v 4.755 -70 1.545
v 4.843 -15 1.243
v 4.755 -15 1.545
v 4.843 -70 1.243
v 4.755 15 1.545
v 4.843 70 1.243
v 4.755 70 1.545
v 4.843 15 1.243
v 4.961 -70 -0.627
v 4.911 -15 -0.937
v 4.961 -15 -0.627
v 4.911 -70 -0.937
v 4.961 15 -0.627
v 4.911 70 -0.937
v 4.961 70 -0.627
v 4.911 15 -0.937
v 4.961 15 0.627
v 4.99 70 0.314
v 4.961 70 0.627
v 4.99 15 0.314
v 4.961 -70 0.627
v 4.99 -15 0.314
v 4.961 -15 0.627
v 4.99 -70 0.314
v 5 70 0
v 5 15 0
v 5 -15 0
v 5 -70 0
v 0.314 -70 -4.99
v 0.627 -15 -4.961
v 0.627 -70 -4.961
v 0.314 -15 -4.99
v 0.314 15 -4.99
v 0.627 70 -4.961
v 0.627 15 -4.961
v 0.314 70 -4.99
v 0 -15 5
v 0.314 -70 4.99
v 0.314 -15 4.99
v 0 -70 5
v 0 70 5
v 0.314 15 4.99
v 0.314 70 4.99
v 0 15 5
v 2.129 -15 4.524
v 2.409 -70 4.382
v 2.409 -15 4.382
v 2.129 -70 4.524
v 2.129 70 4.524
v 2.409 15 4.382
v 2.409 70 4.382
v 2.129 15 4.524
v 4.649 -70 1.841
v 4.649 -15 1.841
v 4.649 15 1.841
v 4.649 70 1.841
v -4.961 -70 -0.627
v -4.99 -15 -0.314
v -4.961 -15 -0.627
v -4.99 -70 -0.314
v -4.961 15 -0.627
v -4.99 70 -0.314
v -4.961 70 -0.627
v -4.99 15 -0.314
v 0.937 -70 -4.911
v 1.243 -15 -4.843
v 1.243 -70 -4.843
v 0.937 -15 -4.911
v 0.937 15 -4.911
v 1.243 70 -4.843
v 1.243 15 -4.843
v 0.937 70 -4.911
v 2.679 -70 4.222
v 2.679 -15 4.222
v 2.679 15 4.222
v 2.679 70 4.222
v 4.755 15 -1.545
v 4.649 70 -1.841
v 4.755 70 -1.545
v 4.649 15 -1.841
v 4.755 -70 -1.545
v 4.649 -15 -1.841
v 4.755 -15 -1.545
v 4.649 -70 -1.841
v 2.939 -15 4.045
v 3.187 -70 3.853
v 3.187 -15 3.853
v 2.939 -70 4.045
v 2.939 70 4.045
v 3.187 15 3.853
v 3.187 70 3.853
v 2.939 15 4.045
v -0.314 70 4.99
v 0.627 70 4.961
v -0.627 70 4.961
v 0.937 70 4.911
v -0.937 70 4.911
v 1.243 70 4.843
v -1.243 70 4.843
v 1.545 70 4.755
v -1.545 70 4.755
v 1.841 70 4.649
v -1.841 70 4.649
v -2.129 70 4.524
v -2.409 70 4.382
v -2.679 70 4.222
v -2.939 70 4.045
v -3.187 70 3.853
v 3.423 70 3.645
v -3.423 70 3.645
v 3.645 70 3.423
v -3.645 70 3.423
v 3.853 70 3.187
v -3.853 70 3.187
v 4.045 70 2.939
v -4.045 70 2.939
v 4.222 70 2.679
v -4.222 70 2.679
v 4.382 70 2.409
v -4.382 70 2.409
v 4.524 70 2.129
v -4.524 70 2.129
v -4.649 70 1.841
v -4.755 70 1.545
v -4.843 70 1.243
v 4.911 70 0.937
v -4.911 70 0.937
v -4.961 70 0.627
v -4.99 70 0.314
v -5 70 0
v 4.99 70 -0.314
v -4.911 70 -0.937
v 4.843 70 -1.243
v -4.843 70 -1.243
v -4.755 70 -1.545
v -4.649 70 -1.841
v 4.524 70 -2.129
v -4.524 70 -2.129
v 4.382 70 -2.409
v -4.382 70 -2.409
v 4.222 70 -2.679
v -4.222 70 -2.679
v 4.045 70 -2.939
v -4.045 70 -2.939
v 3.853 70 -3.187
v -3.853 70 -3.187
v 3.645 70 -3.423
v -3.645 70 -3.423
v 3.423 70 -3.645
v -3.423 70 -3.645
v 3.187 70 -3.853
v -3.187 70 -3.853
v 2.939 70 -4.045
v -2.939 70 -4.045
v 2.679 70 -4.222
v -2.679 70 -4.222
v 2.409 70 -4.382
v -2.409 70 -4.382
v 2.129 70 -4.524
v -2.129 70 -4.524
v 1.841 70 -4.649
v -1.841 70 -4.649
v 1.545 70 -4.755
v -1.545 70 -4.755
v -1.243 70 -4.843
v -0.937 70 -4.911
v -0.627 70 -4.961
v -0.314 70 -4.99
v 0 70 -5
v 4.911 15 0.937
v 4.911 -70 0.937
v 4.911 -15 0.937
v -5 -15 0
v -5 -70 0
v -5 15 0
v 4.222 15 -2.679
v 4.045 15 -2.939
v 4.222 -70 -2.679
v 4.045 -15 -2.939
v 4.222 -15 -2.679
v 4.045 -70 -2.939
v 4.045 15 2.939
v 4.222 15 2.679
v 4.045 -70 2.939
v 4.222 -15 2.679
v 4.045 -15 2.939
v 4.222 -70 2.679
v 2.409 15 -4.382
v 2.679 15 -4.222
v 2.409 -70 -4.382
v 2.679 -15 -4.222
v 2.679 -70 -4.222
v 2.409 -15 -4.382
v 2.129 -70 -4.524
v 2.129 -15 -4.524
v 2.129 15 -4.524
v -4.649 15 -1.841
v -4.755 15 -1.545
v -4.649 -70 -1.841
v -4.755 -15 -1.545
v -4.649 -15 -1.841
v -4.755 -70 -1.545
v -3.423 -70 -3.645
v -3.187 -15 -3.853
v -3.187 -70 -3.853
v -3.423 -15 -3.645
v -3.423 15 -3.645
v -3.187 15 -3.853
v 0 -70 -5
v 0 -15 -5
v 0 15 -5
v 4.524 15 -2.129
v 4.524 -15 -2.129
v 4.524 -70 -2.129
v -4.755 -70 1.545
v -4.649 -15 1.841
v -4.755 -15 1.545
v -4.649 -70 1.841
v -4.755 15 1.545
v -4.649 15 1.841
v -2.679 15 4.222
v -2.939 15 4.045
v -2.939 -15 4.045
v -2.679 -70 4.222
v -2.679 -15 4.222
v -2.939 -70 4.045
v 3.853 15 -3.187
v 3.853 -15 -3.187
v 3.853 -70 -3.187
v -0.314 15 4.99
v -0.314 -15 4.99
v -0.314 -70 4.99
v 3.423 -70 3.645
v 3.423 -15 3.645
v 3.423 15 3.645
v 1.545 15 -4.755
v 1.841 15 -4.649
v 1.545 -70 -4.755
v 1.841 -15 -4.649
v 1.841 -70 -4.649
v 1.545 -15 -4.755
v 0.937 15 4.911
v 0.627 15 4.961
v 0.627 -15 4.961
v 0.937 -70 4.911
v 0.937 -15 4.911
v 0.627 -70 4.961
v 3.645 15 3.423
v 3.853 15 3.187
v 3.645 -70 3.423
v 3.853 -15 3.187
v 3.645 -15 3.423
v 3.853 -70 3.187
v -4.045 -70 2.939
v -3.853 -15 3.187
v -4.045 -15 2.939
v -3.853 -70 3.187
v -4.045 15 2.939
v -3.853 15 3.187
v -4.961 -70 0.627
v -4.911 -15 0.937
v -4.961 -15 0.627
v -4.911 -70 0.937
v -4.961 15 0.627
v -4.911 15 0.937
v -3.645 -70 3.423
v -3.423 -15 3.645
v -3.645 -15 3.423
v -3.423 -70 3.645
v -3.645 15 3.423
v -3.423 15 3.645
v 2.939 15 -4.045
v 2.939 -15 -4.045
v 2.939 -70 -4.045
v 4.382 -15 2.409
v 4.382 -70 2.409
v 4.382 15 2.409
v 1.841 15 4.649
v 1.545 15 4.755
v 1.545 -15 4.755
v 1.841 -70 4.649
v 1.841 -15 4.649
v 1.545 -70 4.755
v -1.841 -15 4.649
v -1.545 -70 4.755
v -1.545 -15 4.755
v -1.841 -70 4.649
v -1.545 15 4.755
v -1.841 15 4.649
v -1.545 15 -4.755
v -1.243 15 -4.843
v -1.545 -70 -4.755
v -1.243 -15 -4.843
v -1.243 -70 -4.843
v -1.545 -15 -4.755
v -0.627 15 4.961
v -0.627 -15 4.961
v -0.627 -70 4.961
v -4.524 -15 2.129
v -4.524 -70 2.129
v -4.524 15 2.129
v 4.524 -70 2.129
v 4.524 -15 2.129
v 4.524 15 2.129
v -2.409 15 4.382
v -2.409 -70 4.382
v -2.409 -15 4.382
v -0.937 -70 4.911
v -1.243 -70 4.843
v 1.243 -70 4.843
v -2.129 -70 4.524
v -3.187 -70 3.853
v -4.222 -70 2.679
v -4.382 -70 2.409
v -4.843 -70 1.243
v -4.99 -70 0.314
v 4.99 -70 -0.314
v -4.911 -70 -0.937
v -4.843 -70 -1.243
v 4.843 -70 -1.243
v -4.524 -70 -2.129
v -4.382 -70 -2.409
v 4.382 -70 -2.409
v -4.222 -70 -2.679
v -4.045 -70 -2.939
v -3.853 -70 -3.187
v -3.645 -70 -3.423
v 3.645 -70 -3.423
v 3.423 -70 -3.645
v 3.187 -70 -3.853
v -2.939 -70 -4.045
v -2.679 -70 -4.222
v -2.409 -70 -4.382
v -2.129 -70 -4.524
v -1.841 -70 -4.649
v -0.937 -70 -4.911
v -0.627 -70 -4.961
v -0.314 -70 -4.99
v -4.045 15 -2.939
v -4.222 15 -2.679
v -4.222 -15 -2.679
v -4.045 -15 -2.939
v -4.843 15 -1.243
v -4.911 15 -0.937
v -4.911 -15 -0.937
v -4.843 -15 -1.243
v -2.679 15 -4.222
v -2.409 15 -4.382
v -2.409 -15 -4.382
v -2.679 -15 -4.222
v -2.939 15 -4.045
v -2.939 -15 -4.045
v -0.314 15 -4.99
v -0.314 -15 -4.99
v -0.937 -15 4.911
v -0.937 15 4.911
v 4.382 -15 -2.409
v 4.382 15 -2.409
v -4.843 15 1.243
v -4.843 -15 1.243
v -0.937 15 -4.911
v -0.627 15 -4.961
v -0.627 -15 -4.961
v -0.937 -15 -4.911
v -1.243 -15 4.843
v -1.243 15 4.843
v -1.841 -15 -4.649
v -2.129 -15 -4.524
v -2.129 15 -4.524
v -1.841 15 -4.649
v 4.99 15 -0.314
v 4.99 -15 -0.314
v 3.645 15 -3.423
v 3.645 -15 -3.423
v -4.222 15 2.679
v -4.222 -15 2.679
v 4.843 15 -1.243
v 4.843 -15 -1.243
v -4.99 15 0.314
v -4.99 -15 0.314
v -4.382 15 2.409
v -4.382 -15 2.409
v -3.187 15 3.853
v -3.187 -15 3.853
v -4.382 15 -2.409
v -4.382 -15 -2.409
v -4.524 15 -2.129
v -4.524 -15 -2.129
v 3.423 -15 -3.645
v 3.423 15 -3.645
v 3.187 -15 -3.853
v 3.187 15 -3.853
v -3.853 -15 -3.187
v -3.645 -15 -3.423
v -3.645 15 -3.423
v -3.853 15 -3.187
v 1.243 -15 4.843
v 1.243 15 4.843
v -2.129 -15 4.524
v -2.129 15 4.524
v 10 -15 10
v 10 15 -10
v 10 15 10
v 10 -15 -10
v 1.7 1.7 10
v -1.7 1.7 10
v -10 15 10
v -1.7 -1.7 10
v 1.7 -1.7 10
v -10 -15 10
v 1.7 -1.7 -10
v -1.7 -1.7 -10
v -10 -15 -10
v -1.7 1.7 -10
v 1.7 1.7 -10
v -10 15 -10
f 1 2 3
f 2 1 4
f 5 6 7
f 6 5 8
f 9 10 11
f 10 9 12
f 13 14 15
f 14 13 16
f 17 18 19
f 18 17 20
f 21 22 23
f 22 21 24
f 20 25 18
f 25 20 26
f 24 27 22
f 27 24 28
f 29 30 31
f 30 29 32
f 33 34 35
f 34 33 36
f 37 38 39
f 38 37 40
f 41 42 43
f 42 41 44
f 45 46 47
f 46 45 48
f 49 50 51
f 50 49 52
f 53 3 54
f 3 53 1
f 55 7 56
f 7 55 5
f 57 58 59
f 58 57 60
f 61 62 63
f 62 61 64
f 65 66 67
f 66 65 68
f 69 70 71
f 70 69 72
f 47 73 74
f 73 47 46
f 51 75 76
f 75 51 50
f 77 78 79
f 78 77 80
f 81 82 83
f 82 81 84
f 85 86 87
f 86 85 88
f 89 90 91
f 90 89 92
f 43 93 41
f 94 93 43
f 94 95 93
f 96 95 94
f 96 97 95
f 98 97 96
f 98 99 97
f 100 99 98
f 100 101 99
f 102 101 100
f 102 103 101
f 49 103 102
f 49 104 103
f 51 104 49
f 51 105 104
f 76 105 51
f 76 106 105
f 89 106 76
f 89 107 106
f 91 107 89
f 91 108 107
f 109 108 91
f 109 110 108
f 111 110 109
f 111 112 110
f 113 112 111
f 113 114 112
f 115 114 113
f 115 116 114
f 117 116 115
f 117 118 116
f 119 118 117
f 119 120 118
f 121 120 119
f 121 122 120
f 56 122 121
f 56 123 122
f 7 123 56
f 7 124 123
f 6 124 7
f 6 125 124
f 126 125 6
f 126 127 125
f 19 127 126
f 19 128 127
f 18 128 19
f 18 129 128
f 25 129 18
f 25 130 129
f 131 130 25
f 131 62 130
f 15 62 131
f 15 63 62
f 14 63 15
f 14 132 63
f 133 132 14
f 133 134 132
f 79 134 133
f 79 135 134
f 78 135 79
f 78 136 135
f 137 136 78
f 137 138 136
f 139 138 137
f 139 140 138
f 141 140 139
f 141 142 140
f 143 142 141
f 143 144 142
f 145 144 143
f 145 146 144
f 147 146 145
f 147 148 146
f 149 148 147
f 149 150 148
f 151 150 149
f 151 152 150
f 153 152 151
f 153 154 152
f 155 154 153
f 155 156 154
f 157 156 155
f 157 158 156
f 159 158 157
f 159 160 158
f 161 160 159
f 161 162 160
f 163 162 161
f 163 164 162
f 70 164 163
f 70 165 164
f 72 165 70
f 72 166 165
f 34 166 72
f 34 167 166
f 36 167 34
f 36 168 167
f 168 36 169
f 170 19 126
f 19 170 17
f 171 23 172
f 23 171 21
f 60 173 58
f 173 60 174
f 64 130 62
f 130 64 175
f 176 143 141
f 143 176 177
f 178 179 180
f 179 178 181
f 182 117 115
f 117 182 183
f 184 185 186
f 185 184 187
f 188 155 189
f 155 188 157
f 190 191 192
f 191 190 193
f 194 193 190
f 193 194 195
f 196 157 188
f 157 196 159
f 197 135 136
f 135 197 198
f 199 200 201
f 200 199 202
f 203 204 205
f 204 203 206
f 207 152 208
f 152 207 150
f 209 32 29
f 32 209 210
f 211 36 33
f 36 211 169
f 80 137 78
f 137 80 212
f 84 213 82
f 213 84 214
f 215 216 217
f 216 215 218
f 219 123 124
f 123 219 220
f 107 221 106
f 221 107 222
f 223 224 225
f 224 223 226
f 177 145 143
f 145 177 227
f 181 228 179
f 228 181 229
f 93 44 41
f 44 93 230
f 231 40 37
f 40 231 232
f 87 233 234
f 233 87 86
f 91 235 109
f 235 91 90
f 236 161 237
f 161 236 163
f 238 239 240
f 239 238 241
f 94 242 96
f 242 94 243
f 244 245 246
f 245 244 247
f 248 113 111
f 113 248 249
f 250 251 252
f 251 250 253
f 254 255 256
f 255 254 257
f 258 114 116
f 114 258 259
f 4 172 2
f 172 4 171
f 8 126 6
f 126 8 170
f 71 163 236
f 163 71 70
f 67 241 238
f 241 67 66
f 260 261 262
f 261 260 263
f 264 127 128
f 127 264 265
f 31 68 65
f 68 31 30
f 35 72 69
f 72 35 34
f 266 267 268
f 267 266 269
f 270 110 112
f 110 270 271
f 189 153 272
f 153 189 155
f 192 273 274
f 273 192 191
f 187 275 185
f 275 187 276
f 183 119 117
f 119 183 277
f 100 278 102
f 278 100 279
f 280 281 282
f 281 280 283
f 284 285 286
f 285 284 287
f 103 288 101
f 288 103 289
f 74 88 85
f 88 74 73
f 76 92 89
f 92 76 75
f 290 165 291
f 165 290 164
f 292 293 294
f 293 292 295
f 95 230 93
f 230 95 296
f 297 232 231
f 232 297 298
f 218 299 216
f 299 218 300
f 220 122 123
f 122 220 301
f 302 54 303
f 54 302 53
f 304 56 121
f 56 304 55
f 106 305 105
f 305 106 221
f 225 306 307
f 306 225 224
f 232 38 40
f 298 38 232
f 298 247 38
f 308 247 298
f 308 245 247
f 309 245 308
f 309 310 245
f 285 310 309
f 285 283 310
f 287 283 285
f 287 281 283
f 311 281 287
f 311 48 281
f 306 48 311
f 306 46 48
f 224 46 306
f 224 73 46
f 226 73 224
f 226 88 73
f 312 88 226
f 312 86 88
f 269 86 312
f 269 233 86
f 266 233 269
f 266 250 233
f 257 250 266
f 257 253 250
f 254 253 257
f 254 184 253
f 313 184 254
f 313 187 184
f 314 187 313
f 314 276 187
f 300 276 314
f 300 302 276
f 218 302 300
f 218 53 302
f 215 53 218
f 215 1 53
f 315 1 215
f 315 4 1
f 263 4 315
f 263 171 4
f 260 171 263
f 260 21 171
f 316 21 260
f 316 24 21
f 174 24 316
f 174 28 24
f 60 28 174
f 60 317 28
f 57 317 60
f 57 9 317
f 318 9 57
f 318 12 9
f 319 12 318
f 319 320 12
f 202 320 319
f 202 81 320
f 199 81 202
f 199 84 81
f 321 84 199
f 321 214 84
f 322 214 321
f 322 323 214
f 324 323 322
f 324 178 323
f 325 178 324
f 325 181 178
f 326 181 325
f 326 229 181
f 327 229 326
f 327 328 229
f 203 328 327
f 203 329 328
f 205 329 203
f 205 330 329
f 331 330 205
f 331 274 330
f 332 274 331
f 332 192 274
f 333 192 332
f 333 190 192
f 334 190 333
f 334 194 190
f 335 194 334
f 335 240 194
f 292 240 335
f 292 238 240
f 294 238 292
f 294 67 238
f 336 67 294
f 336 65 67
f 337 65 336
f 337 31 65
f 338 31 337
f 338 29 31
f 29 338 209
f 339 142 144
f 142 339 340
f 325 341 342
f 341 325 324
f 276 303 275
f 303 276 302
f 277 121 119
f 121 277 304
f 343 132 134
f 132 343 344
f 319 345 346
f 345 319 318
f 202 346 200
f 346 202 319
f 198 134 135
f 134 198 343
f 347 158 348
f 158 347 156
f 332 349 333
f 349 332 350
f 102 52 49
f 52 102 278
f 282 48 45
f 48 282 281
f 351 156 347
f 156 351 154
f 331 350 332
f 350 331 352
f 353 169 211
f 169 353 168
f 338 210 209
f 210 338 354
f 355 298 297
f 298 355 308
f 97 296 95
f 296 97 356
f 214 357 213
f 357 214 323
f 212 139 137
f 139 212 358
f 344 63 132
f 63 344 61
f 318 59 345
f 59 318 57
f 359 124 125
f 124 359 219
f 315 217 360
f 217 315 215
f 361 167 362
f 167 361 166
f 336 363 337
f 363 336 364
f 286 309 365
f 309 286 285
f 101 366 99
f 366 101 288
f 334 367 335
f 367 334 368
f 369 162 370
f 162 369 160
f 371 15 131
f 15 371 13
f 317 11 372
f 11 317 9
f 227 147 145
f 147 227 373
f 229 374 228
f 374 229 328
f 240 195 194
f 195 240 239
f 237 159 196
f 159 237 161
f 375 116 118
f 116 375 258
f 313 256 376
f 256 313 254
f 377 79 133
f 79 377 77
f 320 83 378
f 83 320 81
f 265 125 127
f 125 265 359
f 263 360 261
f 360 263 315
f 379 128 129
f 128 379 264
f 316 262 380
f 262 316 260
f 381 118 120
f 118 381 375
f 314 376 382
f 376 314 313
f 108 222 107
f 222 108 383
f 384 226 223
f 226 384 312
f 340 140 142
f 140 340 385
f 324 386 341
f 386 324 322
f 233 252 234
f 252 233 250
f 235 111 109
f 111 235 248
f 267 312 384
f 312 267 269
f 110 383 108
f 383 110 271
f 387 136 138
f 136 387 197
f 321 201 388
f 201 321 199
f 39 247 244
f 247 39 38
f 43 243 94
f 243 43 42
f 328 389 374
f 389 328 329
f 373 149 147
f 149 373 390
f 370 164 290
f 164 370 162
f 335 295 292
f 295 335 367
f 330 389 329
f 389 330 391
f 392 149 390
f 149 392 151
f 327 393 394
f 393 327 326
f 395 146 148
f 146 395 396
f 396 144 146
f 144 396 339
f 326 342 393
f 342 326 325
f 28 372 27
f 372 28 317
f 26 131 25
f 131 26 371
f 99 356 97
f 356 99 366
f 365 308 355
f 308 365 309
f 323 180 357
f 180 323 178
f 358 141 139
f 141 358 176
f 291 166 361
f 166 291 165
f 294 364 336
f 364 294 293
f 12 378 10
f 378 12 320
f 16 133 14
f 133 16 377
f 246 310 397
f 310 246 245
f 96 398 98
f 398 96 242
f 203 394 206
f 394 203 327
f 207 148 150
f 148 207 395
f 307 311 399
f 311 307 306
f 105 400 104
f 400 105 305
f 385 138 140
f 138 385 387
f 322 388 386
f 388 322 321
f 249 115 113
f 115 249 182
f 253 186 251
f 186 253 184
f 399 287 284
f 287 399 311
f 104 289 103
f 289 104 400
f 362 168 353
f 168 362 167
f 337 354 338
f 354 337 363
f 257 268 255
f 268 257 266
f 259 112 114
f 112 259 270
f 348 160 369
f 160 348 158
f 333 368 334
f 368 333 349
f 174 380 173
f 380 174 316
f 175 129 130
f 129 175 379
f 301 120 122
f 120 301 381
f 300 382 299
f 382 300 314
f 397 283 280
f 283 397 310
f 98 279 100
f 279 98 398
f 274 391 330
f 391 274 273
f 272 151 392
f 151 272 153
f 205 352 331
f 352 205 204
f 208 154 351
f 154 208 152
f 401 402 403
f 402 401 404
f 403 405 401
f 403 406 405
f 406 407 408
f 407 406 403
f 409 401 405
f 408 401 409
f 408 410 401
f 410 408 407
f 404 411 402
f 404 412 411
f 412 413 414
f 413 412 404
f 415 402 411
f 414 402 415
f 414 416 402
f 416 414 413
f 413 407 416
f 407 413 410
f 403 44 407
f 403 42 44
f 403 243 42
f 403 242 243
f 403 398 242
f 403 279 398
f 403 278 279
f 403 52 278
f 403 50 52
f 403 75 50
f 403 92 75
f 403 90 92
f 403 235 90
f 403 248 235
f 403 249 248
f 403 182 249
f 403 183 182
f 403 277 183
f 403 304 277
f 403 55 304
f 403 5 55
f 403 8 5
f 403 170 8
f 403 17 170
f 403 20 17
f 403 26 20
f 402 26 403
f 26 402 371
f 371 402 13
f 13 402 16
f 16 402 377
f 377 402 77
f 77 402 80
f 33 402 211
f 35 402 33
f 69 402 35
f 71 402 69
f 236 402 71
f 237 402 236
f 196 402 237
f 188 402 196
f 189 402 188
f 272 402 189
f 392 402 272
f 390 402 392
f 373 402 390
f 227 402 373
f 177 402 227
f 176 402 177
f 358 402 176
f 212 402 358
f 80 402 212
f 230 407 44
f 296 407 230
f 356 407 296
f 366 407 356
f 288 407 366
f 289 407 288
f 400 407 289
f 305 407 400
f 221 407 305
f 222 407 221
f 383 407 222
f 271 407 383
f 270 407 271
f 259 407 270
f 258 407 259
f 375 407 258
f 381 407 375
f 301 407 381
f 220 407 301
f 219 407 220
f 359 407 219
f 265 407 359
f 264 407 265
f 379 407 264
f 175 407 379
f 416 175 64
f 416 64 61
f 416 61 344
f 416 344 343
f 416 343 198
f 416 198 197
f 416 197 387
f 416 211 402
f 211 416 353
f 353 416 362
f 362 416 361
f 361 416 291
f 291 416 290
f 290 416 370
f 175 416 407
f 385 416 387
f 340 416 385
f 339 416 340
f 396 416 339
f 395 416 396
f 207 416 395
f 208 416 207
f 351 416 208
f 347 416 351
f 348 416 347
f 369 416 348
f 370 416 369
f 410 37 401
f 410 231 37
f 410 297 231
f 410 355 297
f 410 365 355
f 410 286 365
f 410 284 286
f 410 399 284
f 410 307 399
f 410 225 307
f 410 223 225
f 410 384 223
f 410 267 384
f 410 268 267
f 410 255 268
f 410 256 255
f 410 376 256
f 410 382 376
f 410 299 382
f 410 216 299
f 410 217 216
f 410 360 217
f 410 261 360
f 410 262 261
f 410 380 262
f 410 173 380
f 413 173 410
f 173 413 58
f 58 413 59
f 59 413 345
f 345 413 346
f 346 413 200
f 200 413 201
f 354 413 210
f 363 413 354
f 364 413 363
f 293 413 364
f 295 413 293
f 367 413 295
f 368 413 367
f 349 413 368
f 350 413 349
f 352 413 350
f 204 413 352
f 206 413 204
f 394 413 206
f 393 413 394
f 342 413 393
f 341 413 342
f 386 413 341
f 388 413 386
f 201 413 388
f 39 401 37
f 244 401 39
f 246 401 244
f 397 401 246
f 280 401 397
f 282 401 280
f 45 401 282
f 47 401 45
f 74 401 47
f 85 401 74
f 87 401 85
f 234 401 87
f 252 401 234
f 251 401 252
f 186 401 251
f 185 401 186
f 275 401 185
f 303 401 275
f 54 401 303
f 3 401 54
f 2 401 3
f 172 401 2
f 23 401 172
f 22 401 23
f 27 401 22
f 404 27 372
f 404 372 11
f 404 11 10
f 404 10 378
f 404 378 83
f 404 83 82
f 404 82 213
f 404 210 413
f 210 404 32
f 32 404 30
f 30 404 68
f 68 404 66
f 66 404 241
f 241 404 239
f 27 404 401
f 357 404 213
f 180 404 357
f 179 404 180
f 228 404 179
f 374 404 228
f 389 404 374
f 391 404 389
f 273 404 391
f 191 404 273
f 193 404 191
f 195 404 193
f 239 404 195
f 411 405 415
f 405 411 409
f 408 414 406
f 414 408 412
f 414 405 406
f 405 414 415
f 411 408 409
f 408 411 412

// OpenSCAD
$fn = 100;

difference()
{
    union()
    {
        rotate([90,0,0]){cylinder(h=140,r1=5,r2=5,center = true);};
        cube([20,30,20],center = true);

    }
    cube([3.4,3.4,50], center = true);   

}      
